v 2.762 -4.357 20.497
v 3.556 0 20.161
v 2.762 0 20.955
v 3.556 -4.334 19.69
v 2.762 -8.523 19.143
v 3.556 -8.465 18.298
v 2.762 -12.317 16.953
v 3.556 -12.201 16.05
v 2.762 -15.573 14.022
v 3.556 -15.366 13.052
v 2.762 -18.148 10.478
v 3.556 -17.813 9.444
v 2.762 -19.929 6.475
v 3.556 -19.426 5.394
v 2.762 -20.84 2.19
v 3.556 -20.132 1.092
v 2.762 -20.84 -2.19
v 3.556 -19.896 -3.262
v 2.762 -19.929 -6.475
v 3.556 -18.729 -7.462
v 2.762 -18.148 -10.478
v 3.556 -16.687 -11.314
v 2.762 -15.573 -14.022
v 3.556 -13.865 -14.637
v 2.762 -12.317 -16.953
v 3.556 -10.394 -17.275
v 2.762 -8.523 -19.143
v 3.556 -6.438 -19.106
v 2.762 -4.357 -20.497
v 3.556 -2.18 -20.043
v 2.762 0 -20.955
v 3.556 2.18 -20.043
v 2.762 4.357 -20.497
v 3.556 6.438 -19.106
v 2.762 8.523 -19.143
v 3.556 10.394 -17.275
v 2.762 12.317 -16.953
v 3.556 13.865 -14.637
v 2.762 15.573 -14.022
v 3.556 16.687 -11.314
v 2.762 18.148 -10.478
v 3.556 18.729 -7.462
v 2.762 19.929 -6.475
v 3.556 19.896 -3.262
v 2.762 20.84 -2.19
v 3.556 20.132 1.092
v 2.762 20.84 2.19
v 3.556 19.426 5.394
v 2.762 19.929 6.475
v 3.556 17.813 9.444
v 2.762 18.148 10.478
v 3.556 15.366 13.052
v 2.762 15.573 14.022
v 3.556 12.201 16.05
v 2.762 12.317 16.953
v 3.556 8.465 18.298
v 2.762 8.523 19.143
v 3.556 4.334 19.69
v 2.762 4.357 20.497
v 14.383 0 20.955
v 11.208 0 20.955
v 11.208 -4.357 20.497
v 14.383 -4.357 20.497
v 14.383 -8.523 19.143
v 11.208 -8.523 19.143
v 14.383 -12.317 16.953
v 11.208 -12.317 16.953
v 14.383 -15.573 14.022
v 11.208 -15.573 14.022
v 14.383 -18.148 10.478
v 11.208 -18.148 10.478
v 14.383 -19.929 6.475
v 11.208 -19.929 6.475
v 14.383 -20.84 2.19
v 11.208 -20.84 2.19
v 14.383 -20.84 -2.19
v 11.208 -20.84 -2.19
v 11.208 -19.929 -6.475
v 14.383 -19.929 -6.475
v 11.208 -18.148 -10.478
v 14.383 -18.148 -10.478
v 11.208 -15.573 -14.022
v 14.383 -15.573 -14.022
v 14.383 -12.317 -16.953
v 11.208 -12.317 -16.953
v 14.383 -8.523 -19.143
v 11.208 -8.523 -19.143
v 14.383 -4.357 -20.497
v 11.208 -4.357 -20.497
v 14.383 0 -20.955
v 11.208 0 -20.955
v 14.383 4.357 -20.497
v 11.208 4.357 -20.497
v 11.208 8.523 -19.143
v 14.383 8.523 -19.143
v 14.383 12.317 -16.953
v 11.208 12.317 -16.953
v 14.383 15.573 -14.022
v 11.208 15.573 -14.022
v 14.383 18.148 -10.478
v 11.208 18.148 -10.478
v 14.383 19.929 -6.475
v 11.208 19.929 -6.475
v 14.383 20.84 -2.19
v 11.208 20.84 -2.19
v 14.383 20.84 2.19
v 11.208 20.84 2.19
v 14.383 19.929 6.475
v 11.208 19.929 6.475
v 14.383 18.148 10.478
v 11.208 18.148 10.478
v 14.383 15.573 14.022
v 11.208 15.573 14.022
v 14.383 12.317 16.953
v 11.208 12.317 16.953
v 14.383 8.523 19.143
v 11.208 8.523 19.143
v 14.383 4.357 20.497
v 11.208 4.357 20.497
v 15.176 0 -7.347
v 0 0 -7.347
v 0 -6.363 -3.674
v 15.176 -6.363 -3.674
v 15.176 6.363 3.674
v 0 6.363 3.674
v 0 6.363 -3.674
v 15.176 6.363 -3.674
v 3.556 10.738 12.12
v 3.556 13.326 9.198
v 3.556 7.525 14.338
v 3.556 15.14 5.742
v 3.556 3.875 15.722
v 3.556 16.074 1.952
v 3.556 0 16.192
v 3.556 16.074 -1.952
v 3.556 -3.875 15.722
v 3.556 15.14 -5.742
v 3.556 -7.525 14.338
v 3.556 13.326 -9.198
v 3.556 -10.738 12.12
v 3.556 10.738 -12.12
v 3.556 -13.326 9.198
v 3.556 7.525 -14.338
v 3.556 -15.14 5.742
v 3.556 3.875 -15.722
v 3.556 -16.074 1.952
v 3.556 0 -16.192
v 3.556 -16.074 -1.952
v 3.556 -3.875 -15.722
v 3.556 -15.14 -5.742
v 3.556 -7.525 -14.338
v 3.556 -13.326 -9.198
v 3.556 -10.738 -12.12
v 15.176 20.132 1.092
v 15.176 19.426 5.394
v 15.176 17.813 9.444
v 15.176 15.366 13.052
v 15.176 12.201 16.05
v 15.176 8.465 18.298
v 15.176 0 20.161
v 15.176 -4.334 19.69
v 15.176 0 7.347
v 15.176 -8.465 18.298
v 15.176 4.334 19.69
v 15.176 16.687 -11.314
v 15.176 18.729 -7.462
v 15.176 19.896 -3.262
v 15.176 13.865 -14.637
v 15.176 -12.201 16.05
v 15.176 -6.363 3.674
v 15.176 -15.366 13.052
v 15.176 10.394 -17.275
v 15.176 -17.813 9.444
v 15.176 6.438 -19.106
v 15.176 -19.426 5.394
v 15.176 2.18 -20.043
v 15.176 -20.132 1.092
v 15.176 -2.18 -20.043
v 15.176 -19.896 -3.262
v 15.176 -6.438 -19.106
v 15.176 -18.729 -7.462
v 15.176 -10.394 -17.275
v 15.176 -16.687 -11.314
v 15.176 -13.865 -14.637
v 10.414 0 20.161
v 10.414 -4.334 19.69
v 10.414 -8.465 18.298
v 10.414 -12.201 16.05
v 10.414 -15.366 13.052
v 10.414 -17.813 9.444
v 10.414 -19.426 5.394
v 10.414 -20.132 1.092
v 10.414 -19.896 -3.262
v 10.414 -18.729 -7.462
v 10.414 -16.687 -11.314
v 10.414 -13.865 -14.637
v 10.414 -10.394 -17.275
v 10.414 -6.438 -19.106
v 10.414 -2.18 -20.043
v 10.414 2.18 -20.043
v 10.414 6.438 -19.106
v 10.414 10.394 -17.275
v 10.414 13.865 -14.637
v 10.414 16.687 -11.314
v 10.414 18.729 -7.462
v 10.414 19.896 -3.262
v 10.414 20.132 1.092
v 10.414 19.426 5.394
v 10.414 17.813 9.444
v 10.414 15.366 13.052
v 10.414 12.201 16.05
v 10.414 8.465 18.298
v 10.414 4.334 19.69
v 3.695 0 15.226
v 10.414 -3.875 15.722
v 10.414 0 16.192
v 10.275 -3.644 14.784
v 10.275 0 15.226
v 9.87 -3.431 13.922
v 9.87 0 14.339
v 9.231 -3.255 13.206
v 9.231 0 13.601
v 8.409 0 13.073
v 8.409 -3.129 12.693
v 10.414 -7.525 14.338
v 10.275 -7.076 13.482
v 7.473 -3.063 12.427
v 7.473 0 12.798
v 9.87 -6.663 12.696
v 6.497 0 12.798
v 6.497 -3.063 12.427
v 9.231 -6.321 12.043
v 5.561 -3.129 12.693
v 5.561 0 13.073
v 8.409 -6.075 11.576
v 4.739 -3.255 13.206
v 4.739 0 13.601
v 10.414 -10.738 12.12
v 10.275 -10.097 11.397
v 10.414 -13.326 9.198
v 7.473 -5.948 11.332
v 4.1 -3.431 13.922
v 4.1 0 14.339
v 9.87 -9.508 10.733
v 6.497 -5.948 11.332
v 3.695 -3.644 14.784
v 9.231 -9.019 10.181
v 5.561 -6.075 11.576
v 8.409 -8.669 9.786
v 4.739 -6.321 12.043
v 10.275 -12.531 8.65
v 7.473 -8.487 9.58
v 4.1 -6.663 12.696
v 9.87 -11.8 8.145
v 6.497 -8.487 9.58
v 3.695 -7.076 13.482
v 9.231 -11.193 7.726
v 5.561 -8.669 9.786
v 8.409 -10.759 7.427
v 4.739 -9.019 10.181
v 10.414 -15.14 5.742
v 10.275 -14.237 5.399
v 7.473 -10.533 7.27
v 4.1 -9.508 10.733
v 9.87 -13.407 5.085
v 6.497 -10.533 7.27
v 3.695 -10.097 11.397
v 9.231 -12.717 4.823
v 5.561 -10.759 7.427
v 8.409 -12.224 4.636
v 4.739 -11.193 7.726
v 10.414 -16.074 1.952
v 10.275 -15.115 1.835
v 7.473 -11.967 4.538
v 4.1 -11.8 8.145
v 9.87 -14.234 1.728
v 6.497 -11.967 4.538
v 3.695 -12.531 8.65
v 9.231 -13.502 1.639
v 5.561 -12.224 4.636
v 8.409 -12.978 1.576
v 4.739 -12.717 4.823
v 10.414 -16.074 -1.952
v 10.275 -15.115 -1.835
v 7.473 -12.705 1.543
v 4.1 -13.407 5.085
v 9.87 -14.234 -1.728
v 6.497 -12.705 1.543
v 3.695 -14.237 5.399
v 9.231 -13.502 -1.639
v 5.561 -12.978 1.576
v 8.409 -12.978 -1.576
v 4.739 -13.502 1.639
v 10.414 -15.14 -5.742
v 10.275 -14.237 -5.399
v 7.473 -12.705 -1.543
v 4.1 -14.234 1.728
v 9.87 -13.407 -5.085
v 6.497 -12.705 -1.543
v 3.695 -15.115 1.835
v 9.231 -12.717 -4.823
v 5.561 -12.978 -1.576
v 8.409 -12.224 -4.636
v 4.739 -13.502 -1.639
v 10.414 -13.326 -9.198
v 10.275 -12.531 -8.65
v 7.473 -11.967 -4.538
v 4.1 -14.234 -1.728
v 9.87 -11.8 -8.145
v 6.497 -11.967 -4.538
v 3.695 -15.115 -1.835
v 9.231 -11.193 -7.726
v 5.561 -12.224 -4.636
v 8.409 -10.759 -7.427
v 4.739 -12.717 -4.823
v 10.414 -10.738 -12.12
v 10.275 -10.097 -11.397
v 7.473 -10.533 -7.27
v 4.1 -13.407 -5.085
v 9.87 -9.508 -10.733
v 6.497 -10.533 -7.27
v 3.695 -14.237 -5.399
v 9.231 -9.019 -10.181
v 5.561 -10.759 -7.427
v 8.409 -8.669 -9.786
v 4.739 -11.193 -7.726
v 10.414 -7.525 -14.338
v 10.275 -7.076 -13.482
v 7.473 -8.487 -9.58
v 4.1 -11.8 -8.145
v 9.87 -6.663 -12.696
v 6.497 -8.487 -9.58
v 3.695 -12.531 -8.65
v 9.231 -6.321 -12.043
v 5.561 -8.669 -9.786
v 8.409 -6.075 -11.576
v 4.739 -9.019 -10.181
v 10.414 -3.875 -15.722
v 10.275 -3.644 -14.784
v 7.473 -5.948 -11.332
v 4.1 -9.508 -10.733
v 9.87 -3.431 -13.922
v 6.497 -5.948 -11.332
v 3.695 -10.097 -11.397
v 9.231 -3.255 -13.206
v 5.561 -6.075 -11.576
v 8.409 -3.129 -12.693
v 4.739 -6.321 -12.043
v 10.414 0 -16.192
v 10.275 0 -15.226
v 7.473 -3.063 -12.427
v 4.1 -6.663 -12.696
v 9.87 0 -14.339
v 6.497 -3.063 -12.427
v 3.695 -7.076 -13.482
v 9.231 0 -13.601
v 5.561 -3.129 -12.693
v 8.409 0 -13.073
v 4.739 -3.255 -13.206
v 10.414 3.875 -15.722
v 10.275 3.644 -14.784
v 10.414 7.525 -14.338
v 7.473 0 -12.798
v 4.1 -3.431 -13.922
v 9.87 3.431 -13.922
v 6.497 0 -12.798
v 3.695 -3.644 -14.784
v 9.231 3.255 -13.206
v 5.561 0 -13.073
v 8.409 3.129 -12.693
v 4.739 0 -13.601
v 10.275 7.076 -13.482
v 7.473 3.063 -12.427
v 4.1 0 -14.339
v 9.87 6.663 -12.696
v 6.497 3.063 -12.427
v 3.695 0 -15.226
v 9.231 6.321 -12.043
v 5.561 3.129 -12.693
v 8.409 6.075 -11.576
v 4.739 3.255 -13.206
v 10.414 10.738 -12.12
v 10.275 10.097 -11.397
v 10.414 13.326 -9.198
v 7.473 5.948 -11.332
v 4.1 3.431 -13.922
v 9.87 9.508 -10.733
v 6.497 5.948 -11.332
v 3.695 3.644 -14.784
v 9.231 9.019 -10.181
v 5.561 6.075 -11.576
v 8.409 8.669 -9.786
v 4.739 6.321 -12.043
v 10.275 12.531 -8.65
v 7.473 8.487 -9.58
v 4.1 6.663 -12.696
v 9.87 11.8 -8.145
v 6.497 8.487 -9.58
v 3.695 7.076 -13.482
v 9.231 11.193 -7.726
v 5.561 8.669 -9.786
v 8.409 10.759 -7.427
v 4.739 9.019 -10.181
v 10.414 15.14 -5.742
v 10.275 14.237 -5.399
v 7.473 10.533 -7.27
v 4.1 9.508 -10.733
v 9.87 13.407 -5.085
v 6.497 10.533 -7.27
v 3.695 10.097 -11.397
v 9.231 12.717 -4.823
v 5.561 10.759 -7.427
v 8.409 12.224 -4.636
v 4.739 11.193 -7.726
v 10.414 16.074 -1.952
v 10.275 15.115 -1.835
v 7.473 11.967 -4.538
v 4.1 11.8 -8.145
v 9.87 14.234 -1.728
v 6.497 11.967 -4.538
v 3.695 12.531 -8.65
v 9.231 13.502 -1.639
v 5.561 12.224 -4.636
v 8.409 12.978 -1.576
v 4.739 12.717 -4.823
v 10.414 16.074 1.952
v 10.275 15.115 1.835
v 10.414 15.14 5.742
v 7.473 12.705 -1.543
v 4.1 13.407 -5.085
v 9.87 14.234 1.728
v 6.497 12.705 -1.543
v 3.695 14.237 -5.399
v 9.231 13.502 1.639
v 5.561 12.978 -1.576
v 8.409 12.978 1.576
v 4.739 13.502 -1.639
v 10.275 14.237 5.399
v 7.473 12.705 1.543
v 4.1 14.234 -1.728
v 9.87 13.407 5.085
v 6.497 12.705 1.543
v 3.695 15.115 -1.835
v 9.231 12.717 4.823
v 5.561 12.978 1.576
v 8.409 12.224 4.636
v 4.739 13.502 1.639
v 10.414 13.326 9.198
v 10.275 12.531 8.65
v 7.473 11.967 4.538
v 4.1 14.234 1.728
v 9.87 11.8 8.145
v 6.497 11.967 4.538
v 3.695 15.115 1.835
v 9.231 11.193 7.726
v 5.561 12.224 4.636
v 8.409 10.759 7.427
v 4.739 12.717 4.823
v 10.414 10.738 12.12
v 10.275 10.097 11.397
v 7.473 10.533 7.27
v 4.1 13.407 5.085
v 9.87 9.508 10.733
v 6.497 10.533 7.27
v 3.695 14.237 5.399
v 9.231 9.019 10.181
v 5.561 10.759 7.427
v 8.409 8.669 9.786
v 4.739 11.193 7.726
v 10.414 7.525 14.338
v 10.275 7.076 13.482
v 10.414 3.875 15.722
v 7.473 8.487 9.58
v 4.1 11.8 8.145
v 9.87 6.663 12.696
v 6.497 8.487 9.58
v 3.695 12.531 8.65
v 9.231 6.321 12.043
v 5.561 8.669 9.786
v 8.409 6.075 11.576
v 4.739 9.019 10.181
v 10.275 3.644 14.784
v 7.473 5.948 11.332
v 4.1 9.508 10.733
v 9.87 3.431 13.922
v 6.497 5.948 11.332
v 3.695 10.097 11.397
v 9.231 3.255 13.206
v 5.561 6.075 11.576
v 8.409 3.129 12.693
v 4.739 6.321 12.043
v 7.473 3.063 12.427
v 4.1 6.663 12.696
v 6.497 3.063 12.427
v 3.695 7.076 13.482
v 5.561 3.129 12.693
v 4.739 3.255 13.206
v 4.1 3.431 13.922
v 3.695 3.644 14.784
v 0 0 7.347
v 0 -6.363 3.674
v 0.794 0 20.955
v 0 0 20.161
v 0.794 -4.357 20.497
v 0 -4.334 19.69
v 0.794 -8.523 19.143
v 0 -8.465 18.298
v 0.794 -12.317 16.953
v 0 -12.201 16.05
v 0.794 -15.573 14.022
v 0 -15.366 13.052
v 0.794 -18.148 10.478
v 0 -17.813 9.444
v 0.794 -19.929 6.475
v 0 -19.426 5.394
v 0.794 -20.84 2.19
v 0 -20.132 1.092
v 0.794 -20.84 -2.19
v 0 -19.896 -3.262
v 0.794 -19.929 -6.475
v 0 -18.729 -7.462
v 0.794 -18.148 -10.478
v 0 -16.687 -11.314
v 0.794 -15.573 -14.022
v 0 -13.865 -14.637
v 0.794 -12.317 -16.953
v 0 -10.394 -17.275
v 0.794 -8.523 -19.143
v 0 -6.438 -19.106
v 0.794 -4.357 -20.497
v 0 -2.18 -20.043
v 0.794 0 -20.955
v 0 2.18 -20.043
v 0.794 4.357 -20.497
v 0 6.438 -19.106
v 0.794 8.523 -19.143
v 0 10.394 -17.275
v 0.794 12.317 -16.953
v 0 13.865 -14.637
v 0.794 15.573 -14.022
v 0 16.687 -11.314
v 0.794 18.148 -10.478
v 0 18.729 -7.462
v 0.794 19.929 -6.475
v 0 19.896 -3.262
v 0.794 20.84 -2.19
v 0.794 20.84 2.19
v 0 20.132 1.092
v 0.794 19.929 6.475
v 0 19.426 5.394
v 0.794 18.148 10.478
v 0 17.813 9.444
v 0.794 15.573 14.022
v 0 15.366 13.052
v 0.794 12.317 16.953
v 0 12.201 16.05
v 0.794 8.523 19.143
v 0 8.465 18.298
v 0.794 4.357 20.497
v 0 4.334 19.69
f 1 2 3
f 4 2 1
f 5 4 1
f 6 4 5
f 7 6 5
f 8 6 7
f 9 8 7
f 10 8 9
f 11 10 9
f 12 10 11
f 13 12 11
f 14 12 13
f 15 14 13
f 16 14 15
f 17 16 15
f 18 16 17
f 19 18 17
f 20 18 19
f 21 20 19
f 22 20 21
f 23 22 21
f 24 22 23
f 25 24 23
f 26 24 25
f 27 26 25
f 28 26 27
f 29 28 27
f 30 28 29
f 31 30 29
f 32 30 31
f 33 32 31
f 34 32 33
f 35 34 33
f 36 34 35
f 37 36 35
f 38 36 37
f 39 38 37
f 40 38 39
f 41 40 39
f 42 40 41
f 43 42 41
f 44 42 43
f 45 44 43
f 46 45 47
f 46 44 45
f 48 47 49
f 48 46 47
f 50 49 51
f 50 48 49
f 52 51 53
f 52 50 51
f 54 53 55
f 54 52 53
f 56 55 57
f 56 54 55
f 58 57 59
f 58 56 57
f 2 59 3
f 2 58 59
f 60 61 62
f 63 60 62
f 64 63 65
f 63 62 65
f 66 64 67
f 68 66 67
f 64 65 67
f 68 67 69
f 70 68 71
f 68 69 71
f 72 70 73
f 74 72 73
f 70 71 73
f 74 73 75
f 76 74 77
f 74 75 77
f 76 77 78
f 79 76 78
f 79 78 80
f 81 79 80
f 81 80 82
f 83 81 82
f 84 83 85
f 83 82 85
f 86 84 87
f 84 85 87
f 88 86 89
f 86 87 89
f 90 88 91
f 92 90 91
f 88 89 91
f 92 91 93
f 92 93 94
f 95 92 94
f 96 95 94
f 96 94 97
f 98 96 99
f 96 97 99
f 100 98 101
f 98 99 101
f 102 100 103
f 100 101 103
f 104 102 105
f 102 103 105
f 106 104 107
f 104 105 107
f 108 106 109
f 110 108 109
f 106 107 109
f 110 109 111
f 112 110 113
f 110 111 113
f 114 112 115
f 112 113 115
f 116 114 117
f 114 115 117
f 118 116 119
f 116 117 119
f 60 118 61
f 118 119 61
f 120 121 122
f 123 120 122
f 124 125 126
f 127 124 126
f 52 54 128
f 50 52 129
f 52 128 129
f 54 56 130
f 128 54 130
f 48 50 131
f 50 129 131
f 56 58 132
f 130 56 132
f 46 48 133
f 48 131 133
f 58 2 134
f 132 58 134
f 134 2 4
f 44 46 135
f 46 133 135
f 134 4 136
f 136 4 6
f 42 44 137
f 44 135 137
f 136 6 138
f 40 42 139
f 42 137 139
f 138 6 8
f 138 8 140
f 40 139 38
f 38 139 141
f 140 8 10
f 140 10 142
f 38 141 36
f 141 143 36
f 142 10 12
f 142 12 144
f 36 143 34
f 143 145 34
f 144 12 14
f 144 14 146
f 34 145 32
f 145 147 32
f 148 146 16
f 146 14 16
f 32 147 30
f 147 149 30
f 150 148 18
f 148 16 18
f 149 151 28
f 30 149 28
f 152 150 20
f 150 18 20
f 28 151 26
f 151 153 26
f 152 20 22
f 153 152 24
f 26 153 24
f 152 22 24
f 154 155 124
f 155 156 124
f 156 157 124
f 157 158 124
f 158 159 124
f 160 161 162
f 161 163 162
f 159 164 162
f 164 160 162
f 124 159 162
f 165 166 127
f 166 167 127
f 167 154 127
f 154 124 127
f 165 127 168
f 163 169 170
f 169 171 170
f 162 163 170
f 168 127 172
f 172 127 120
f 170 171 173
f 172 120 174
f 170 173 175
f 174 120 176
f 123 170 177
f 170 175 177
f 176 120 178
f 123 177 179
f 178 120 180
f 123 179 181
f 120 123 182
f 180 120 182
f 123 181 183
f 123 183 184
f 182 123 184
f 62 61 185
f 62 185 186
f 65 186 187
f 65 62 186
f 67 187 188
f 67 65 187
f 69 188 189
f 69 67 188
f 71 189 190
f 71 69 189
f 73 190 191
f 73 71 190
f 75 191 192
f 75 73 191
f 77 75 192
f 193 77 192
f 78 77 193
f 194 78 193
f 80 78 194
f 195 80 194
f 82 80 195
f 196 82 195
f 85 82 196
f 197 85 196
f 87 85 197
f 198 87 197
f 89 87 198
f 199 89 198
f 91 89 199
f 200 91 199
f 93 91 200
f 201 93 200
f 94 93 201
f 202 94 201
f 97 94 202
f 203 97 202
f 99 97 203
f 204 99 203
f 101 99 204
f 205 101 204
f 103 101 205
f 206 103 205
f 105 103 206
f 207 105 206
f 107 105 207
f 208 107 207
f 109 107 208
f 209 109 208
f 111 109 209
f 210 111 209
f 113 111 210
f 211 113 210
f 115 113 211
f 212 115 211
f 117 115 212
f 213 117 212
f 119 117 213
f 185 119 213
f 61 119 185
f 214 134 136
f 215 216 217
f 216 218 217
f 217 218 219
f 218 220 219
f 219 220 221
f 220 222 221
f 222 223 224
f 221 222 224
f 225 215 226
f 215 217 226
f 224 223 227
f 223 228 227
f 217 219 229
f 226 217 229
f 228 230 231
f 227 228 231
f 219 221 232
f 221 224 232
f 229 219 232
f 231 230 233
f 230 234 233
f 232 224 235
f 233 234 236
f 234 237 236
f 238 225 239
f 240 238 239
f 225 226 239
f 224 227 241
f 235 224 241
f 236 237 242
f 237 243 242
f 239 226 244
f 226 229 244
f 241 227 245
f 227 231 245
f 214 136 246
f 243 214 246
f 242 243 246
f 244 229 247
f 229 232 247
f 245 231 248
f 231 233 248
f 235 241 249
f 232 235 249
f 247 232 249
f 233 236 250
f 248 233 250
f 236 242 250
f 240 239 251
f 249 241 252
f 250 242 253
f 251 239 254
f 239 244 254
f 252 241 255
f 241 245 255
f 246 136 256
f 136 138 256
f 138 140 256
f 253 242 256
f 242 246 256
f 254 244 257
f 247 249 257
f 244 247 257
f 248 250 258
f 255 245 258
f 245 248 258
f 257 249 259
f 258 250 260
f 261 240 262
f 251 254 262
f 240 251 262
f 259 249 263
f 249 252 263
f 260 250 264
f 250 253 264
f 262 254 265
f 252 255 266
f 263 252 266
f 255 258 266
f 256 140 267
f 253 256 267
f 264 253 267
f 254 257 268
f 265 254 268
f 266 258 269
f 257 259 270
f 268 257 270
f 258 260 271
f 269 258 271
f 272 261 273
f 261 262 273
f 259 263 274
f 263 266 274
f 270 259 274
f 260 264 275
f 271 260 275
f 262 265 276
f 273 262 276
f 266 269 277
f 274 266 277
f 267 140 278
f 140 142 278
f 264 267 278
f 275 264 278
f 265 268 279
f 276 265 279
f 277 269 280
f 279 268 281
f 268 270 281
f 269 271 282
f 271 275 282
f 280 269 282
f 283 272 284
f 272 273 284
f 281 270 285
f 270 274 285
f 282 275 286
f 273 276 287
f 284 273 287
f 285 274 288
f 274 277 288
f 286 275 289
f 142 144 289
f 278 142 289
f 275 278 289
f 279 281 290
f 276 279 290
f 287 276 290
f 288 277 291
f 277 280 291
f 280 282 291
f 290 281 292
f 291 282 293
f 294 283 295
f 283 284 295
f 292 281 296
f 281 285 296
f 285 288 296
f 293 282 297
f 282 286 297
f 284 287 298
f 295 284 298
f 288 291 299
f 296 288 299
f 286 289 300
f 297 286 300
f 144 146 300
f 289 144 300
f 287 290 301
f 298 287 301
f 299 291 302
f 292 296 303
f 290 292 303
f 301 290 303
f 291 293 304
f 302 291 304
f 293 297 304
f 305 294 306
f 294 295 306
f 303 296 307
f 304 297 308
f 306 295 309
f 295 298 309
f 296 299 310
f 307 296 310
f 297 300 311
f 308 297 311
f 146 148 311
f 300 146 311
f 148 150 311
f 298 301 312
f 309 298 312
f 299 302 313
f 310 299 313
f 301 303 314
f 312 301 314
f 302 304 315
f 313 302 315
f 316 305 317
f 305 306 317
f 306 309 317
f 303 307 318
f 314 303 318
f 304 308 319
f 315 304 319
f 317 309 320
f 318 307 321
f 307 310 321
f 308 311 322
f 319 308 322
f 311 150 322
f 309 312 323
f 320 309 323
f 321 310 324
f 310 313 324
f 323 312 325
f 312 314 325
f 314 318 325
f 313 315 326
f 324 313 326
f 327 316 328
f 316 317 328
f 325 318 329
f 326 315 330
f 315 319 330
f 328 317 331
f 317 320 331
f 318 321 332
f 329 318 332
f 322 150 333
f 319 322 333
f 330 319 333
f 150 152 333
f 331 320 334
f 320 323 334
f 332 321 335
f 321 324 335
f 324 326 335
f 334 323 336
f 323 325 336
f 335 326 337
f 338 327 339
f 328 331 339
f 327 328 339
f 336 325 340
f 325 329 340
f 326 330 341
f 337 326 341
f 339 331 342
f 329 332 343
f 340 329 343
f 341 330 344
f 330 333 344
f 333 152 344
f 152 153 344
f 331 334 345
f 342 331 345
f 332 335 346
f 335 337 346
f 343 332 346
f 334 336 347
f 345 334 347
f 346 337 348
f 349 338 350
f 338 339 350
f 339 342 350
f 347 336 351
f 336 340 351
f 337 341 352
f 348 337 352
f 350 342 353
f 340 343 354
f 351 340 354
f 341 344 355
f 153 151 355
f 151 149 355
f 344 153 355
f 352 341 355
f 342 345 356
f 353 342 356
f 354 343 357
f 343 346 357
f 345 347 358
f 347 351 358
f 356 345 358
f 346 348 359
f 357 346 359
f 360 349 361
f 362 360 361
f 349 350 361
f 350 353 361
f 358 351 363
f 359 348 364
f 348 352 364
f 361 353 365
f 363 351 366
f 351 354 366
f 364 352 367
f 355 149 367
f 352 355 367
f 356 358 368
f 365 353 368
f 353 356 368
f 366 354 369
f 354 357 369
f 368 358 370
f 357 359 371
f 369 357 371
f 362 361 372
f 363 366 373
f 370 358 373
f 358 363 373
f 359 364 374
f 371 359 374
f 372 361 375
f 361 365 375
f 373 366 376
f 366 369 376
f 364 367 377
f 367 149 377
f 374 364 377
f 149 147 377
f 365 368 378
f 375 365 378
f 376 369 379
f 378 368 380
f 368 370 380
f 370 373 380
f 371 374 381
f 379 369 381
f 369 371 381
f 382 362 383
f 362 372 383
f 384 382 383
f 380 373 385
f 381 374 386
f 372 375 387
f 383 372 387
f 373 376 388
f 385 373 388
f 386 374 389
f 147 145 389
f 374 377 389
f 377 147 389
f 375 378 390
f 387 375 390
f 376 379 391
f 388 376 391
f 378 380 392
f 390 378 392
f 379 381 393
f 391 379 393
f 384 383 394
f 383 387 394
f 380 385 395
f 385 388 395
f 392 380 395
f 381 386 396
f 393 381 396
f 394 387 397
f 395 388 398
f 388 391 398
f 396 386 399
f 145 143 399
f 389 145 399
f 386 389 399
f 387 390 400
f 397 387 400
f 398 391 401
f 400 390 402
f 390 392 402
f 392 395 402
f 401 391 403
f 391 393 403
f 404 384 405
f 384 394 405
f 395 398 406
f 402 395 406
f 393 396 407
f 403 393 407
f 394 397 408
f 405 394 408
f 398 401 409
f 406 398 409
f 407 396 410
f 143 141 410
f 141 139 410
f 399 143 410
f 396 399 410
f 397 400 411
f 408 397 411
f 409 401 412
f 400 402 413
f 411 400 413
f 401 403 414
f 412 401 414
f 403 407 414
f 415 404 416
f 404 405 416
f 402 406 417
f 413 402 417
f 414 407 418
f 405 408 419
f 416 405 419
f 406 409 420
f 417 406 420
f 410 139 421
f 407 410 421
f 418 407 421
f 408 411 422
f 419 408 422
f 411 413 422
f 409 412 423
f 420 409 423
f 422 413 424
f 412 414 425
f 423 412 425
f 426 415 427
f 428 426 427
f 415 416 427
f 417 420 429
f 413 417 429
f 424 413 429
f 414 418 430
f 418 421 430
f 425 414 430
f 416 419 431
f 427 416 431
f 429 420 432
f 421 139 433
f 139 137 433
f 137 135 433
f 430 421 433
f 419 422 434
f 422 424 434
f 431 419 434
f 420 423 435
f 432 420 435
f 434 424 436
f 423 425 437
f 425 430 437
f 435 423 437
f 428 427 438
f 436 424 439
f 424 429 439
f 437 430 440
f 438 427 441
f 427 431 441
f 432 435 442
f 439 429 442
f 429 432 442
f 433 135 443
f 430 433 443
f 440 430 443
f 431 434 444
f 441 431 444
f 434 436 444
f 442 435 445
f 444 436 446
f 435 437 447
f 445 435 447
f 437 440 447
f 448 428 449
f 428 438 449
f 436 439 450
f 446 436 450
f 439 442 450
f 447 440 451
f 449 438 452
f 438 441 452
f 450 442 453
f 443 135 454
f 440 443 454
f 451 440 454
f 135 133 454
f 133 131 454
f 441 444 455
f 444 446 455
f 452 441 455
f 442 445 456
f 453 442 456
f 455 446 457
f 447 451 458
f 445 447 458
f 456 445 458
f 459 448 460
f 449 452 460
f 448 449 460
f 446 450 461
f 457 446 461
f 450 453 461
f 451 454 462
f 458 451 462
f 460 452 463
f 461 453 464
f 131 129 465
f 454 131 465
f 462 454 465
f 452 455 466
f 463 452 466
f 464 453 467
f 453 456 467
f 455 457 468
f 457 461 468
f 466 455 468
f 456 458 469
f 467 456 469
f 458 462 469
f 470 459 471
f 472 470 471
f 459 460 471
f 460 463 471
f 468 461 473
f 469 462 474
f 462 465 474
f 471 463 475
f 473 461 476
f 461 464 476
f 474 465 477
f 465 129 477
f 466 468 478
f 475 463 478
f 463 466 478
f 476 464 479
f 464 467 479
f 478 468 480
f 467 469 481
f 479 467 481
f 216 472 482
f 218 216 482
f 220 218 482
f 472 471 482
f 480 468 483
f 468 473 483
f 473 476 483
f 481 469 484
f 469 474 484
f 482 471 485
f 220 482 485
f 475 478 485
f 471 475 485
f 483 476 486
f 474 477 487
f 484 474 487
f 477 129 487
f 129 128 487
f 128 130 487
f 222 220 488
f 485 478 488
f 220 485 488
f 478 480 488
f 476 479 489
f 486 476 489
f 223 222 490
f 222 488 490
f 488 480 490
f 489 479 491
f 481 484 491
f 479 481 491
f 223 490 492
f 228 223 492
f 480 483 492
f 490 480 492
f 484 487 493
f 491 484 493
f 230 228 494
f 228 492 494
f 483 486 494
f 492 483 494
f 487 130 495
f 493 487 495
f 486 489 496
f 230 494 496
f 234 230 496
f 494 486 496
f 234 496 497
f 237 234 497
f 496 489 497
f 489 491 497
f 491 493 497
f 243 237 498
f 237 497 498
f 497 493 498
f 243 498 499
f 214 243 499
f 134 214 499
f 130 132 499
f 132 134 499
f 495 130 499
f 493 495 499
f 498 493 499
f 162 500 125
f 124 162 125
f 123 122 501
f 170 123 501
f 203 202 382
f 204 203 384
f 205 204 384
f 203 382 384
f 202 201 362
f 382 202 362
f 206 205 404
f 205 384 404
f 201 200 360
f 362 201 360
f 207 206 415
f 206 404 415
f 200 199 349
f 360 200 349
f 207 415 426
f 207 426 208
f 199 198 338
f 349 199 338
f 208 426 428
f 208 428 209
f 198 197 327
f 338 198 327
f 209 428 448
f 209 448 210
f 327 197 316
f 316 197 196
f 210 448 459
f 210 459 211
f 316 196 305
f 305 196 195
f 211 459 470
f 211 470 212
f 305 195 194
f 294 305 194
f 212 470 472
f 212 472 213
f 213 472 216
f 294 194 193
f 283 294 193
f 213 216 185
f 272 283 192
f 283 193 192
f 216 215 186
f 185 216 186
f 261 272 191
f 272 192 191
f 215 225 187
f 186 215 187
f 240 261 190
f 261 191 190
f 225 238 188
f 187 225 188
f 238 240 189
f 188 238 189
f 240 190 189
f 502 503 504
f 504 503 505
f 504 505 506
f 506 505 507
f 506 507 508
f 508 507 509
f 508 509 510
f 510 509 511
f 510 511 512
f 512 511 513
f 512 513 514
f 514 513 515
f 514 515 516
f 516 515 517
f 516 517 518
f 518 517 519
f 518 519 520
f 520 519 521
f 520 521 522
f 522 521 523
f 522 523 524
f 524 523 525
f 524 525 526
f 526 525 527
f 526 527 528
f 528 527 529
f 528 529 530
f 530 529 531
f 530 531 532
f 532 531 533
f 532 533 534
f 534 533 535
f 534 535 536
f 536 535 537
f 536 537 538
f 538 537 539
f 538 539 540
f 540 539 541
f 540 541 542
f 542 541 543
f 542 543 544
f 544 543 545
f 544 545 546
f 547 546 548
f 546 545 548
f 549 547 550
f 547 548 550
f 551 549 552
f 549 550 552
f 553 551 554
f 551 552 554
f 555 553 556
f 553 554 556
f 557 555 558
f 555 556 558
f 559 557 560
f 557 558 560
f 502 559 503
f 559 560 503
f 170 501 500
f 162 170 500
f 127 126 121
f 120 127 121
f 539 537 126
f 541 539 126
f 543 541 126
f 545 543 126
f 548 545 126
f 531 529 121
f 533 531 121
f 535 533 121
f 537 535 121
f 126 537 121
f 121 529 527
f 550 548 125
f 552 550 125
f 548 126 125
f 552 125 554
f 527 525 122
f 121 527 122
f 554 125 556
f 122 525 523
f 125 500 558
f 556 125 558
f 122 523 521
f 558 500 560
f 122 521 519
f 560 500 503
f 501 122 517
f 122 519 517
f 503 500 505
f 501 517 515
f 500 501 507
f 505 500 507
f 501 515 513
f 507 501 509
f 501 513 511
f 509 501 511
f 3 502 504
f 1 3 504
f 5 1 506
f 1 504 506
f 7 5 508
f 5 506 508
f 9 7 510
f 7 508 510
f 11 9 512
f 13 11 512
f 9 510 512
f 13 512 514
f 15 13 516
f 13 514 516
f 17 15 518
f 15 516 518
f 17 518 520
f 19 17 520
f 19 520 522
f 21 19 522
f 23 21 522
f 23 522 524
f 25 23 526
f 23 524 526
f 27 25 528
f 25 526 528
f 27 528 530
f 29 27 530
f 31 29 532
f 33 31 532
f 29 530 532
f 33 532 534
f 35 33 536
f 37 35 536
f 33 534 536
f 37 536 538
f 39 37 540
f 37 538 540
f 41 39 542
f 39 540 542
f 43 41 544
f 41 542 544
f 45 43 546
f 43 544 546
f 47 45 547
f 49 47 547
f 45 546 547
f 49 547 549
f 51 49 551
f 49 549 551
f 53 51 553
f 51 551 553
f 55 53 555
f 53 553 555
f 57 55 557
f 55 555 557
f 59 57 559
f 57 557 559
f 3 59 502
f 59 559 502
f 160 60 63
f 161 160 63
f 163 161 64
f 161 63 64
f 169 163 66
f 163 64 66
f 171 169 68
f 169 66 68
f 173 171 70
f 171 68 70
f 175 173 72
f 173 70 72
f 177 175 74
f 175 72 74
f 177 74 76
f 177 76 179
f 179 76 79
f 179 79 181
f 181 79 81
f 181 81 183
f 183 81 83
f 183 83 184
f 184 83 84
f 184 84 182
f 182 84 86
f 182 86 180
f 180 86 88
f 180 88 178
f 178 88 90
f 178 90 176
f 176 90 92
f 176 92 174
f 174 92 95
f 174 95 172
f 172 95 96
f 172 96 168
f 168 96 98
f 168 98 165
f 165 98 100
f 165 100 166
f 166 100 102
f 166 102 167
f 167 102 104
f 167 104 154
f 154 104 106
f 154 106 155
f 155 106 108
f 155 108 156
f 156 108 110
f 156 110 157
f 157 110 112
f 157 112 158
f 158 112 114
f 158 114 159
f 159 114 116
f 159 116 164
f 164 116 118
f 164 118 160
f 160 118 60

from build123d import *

# Parameters (mm, degrees)
CHAMFER1_SIZE      = 0.79375
CUT_EXTRUDE1_DEPTH = 34.294897541
CHAMFER2_SIZE      = 0.79375


with BuildPart() as part:
    # Sketch1 → Revolve1 (revolve)
    with BuildSketch(Plane.XY, mode=Mode.PRIVATE) as revolve1_sk:
        with BuildLine():
            Line((0, 0), (15.1765, 0))
            Line((15.1765, 0), (15.1765, 20.955))
            Line((15.1765, 20.955), (10.414, 20.955))
            Line((10.414, 20.955), (10.414, 16.1925))
            ThreePointArc((10.414, 16.1925), (6.985, 12.7635), (3.556, 16.1925))
            Line((3.556, 16.1925), (3.556, 20.955))
            Line((3.556, 20.955), (0, 20.955))
            Line((0, 20.955), (0, 0))
        make_face()
    revolve(revolve1_sk.sketch.rotate(Axis((0, 0, 0), (1, 0, 0)), 90), axis=Axis((0, 0, 0), (1, 0, 0)))

    # Chamfer1
    chamfer1_edges = [part.edges().sort_by_distance(p)[0] for p in [
        (0, 0, -20.955),
    ]]
    chamfer(chamfer1_edges, length=CHAMFER1_SIZE)

    # Sketch2 → Cut-Extrude1 (cut, through all)
    with BuildSketch(Plane.ZY):
        Polygon((3.673506558, -6.3627), (7.347013116, 0), (3.673506558, 6.3627), (-3.673506558, 6.3627), (-7.347013116, 0), (-3.673506558, -6.3627), align=None)
    extrude(amount=-CUT_EXTRUDE1_DEPTH, mode=Mode.SUBTRACT)

    # Chamfer2
    chamfer2_edges = [part.edges().sort_by_distance(p)[0] for p in [
        (3.556, 0, -20.955),
        (10.414, 0, -20.955),
        (15.1765, 0, -20.955),
    ]]
    chamfer(chamfer2_edges, length=CHAMFER2_SIZE)


solid = part.part
